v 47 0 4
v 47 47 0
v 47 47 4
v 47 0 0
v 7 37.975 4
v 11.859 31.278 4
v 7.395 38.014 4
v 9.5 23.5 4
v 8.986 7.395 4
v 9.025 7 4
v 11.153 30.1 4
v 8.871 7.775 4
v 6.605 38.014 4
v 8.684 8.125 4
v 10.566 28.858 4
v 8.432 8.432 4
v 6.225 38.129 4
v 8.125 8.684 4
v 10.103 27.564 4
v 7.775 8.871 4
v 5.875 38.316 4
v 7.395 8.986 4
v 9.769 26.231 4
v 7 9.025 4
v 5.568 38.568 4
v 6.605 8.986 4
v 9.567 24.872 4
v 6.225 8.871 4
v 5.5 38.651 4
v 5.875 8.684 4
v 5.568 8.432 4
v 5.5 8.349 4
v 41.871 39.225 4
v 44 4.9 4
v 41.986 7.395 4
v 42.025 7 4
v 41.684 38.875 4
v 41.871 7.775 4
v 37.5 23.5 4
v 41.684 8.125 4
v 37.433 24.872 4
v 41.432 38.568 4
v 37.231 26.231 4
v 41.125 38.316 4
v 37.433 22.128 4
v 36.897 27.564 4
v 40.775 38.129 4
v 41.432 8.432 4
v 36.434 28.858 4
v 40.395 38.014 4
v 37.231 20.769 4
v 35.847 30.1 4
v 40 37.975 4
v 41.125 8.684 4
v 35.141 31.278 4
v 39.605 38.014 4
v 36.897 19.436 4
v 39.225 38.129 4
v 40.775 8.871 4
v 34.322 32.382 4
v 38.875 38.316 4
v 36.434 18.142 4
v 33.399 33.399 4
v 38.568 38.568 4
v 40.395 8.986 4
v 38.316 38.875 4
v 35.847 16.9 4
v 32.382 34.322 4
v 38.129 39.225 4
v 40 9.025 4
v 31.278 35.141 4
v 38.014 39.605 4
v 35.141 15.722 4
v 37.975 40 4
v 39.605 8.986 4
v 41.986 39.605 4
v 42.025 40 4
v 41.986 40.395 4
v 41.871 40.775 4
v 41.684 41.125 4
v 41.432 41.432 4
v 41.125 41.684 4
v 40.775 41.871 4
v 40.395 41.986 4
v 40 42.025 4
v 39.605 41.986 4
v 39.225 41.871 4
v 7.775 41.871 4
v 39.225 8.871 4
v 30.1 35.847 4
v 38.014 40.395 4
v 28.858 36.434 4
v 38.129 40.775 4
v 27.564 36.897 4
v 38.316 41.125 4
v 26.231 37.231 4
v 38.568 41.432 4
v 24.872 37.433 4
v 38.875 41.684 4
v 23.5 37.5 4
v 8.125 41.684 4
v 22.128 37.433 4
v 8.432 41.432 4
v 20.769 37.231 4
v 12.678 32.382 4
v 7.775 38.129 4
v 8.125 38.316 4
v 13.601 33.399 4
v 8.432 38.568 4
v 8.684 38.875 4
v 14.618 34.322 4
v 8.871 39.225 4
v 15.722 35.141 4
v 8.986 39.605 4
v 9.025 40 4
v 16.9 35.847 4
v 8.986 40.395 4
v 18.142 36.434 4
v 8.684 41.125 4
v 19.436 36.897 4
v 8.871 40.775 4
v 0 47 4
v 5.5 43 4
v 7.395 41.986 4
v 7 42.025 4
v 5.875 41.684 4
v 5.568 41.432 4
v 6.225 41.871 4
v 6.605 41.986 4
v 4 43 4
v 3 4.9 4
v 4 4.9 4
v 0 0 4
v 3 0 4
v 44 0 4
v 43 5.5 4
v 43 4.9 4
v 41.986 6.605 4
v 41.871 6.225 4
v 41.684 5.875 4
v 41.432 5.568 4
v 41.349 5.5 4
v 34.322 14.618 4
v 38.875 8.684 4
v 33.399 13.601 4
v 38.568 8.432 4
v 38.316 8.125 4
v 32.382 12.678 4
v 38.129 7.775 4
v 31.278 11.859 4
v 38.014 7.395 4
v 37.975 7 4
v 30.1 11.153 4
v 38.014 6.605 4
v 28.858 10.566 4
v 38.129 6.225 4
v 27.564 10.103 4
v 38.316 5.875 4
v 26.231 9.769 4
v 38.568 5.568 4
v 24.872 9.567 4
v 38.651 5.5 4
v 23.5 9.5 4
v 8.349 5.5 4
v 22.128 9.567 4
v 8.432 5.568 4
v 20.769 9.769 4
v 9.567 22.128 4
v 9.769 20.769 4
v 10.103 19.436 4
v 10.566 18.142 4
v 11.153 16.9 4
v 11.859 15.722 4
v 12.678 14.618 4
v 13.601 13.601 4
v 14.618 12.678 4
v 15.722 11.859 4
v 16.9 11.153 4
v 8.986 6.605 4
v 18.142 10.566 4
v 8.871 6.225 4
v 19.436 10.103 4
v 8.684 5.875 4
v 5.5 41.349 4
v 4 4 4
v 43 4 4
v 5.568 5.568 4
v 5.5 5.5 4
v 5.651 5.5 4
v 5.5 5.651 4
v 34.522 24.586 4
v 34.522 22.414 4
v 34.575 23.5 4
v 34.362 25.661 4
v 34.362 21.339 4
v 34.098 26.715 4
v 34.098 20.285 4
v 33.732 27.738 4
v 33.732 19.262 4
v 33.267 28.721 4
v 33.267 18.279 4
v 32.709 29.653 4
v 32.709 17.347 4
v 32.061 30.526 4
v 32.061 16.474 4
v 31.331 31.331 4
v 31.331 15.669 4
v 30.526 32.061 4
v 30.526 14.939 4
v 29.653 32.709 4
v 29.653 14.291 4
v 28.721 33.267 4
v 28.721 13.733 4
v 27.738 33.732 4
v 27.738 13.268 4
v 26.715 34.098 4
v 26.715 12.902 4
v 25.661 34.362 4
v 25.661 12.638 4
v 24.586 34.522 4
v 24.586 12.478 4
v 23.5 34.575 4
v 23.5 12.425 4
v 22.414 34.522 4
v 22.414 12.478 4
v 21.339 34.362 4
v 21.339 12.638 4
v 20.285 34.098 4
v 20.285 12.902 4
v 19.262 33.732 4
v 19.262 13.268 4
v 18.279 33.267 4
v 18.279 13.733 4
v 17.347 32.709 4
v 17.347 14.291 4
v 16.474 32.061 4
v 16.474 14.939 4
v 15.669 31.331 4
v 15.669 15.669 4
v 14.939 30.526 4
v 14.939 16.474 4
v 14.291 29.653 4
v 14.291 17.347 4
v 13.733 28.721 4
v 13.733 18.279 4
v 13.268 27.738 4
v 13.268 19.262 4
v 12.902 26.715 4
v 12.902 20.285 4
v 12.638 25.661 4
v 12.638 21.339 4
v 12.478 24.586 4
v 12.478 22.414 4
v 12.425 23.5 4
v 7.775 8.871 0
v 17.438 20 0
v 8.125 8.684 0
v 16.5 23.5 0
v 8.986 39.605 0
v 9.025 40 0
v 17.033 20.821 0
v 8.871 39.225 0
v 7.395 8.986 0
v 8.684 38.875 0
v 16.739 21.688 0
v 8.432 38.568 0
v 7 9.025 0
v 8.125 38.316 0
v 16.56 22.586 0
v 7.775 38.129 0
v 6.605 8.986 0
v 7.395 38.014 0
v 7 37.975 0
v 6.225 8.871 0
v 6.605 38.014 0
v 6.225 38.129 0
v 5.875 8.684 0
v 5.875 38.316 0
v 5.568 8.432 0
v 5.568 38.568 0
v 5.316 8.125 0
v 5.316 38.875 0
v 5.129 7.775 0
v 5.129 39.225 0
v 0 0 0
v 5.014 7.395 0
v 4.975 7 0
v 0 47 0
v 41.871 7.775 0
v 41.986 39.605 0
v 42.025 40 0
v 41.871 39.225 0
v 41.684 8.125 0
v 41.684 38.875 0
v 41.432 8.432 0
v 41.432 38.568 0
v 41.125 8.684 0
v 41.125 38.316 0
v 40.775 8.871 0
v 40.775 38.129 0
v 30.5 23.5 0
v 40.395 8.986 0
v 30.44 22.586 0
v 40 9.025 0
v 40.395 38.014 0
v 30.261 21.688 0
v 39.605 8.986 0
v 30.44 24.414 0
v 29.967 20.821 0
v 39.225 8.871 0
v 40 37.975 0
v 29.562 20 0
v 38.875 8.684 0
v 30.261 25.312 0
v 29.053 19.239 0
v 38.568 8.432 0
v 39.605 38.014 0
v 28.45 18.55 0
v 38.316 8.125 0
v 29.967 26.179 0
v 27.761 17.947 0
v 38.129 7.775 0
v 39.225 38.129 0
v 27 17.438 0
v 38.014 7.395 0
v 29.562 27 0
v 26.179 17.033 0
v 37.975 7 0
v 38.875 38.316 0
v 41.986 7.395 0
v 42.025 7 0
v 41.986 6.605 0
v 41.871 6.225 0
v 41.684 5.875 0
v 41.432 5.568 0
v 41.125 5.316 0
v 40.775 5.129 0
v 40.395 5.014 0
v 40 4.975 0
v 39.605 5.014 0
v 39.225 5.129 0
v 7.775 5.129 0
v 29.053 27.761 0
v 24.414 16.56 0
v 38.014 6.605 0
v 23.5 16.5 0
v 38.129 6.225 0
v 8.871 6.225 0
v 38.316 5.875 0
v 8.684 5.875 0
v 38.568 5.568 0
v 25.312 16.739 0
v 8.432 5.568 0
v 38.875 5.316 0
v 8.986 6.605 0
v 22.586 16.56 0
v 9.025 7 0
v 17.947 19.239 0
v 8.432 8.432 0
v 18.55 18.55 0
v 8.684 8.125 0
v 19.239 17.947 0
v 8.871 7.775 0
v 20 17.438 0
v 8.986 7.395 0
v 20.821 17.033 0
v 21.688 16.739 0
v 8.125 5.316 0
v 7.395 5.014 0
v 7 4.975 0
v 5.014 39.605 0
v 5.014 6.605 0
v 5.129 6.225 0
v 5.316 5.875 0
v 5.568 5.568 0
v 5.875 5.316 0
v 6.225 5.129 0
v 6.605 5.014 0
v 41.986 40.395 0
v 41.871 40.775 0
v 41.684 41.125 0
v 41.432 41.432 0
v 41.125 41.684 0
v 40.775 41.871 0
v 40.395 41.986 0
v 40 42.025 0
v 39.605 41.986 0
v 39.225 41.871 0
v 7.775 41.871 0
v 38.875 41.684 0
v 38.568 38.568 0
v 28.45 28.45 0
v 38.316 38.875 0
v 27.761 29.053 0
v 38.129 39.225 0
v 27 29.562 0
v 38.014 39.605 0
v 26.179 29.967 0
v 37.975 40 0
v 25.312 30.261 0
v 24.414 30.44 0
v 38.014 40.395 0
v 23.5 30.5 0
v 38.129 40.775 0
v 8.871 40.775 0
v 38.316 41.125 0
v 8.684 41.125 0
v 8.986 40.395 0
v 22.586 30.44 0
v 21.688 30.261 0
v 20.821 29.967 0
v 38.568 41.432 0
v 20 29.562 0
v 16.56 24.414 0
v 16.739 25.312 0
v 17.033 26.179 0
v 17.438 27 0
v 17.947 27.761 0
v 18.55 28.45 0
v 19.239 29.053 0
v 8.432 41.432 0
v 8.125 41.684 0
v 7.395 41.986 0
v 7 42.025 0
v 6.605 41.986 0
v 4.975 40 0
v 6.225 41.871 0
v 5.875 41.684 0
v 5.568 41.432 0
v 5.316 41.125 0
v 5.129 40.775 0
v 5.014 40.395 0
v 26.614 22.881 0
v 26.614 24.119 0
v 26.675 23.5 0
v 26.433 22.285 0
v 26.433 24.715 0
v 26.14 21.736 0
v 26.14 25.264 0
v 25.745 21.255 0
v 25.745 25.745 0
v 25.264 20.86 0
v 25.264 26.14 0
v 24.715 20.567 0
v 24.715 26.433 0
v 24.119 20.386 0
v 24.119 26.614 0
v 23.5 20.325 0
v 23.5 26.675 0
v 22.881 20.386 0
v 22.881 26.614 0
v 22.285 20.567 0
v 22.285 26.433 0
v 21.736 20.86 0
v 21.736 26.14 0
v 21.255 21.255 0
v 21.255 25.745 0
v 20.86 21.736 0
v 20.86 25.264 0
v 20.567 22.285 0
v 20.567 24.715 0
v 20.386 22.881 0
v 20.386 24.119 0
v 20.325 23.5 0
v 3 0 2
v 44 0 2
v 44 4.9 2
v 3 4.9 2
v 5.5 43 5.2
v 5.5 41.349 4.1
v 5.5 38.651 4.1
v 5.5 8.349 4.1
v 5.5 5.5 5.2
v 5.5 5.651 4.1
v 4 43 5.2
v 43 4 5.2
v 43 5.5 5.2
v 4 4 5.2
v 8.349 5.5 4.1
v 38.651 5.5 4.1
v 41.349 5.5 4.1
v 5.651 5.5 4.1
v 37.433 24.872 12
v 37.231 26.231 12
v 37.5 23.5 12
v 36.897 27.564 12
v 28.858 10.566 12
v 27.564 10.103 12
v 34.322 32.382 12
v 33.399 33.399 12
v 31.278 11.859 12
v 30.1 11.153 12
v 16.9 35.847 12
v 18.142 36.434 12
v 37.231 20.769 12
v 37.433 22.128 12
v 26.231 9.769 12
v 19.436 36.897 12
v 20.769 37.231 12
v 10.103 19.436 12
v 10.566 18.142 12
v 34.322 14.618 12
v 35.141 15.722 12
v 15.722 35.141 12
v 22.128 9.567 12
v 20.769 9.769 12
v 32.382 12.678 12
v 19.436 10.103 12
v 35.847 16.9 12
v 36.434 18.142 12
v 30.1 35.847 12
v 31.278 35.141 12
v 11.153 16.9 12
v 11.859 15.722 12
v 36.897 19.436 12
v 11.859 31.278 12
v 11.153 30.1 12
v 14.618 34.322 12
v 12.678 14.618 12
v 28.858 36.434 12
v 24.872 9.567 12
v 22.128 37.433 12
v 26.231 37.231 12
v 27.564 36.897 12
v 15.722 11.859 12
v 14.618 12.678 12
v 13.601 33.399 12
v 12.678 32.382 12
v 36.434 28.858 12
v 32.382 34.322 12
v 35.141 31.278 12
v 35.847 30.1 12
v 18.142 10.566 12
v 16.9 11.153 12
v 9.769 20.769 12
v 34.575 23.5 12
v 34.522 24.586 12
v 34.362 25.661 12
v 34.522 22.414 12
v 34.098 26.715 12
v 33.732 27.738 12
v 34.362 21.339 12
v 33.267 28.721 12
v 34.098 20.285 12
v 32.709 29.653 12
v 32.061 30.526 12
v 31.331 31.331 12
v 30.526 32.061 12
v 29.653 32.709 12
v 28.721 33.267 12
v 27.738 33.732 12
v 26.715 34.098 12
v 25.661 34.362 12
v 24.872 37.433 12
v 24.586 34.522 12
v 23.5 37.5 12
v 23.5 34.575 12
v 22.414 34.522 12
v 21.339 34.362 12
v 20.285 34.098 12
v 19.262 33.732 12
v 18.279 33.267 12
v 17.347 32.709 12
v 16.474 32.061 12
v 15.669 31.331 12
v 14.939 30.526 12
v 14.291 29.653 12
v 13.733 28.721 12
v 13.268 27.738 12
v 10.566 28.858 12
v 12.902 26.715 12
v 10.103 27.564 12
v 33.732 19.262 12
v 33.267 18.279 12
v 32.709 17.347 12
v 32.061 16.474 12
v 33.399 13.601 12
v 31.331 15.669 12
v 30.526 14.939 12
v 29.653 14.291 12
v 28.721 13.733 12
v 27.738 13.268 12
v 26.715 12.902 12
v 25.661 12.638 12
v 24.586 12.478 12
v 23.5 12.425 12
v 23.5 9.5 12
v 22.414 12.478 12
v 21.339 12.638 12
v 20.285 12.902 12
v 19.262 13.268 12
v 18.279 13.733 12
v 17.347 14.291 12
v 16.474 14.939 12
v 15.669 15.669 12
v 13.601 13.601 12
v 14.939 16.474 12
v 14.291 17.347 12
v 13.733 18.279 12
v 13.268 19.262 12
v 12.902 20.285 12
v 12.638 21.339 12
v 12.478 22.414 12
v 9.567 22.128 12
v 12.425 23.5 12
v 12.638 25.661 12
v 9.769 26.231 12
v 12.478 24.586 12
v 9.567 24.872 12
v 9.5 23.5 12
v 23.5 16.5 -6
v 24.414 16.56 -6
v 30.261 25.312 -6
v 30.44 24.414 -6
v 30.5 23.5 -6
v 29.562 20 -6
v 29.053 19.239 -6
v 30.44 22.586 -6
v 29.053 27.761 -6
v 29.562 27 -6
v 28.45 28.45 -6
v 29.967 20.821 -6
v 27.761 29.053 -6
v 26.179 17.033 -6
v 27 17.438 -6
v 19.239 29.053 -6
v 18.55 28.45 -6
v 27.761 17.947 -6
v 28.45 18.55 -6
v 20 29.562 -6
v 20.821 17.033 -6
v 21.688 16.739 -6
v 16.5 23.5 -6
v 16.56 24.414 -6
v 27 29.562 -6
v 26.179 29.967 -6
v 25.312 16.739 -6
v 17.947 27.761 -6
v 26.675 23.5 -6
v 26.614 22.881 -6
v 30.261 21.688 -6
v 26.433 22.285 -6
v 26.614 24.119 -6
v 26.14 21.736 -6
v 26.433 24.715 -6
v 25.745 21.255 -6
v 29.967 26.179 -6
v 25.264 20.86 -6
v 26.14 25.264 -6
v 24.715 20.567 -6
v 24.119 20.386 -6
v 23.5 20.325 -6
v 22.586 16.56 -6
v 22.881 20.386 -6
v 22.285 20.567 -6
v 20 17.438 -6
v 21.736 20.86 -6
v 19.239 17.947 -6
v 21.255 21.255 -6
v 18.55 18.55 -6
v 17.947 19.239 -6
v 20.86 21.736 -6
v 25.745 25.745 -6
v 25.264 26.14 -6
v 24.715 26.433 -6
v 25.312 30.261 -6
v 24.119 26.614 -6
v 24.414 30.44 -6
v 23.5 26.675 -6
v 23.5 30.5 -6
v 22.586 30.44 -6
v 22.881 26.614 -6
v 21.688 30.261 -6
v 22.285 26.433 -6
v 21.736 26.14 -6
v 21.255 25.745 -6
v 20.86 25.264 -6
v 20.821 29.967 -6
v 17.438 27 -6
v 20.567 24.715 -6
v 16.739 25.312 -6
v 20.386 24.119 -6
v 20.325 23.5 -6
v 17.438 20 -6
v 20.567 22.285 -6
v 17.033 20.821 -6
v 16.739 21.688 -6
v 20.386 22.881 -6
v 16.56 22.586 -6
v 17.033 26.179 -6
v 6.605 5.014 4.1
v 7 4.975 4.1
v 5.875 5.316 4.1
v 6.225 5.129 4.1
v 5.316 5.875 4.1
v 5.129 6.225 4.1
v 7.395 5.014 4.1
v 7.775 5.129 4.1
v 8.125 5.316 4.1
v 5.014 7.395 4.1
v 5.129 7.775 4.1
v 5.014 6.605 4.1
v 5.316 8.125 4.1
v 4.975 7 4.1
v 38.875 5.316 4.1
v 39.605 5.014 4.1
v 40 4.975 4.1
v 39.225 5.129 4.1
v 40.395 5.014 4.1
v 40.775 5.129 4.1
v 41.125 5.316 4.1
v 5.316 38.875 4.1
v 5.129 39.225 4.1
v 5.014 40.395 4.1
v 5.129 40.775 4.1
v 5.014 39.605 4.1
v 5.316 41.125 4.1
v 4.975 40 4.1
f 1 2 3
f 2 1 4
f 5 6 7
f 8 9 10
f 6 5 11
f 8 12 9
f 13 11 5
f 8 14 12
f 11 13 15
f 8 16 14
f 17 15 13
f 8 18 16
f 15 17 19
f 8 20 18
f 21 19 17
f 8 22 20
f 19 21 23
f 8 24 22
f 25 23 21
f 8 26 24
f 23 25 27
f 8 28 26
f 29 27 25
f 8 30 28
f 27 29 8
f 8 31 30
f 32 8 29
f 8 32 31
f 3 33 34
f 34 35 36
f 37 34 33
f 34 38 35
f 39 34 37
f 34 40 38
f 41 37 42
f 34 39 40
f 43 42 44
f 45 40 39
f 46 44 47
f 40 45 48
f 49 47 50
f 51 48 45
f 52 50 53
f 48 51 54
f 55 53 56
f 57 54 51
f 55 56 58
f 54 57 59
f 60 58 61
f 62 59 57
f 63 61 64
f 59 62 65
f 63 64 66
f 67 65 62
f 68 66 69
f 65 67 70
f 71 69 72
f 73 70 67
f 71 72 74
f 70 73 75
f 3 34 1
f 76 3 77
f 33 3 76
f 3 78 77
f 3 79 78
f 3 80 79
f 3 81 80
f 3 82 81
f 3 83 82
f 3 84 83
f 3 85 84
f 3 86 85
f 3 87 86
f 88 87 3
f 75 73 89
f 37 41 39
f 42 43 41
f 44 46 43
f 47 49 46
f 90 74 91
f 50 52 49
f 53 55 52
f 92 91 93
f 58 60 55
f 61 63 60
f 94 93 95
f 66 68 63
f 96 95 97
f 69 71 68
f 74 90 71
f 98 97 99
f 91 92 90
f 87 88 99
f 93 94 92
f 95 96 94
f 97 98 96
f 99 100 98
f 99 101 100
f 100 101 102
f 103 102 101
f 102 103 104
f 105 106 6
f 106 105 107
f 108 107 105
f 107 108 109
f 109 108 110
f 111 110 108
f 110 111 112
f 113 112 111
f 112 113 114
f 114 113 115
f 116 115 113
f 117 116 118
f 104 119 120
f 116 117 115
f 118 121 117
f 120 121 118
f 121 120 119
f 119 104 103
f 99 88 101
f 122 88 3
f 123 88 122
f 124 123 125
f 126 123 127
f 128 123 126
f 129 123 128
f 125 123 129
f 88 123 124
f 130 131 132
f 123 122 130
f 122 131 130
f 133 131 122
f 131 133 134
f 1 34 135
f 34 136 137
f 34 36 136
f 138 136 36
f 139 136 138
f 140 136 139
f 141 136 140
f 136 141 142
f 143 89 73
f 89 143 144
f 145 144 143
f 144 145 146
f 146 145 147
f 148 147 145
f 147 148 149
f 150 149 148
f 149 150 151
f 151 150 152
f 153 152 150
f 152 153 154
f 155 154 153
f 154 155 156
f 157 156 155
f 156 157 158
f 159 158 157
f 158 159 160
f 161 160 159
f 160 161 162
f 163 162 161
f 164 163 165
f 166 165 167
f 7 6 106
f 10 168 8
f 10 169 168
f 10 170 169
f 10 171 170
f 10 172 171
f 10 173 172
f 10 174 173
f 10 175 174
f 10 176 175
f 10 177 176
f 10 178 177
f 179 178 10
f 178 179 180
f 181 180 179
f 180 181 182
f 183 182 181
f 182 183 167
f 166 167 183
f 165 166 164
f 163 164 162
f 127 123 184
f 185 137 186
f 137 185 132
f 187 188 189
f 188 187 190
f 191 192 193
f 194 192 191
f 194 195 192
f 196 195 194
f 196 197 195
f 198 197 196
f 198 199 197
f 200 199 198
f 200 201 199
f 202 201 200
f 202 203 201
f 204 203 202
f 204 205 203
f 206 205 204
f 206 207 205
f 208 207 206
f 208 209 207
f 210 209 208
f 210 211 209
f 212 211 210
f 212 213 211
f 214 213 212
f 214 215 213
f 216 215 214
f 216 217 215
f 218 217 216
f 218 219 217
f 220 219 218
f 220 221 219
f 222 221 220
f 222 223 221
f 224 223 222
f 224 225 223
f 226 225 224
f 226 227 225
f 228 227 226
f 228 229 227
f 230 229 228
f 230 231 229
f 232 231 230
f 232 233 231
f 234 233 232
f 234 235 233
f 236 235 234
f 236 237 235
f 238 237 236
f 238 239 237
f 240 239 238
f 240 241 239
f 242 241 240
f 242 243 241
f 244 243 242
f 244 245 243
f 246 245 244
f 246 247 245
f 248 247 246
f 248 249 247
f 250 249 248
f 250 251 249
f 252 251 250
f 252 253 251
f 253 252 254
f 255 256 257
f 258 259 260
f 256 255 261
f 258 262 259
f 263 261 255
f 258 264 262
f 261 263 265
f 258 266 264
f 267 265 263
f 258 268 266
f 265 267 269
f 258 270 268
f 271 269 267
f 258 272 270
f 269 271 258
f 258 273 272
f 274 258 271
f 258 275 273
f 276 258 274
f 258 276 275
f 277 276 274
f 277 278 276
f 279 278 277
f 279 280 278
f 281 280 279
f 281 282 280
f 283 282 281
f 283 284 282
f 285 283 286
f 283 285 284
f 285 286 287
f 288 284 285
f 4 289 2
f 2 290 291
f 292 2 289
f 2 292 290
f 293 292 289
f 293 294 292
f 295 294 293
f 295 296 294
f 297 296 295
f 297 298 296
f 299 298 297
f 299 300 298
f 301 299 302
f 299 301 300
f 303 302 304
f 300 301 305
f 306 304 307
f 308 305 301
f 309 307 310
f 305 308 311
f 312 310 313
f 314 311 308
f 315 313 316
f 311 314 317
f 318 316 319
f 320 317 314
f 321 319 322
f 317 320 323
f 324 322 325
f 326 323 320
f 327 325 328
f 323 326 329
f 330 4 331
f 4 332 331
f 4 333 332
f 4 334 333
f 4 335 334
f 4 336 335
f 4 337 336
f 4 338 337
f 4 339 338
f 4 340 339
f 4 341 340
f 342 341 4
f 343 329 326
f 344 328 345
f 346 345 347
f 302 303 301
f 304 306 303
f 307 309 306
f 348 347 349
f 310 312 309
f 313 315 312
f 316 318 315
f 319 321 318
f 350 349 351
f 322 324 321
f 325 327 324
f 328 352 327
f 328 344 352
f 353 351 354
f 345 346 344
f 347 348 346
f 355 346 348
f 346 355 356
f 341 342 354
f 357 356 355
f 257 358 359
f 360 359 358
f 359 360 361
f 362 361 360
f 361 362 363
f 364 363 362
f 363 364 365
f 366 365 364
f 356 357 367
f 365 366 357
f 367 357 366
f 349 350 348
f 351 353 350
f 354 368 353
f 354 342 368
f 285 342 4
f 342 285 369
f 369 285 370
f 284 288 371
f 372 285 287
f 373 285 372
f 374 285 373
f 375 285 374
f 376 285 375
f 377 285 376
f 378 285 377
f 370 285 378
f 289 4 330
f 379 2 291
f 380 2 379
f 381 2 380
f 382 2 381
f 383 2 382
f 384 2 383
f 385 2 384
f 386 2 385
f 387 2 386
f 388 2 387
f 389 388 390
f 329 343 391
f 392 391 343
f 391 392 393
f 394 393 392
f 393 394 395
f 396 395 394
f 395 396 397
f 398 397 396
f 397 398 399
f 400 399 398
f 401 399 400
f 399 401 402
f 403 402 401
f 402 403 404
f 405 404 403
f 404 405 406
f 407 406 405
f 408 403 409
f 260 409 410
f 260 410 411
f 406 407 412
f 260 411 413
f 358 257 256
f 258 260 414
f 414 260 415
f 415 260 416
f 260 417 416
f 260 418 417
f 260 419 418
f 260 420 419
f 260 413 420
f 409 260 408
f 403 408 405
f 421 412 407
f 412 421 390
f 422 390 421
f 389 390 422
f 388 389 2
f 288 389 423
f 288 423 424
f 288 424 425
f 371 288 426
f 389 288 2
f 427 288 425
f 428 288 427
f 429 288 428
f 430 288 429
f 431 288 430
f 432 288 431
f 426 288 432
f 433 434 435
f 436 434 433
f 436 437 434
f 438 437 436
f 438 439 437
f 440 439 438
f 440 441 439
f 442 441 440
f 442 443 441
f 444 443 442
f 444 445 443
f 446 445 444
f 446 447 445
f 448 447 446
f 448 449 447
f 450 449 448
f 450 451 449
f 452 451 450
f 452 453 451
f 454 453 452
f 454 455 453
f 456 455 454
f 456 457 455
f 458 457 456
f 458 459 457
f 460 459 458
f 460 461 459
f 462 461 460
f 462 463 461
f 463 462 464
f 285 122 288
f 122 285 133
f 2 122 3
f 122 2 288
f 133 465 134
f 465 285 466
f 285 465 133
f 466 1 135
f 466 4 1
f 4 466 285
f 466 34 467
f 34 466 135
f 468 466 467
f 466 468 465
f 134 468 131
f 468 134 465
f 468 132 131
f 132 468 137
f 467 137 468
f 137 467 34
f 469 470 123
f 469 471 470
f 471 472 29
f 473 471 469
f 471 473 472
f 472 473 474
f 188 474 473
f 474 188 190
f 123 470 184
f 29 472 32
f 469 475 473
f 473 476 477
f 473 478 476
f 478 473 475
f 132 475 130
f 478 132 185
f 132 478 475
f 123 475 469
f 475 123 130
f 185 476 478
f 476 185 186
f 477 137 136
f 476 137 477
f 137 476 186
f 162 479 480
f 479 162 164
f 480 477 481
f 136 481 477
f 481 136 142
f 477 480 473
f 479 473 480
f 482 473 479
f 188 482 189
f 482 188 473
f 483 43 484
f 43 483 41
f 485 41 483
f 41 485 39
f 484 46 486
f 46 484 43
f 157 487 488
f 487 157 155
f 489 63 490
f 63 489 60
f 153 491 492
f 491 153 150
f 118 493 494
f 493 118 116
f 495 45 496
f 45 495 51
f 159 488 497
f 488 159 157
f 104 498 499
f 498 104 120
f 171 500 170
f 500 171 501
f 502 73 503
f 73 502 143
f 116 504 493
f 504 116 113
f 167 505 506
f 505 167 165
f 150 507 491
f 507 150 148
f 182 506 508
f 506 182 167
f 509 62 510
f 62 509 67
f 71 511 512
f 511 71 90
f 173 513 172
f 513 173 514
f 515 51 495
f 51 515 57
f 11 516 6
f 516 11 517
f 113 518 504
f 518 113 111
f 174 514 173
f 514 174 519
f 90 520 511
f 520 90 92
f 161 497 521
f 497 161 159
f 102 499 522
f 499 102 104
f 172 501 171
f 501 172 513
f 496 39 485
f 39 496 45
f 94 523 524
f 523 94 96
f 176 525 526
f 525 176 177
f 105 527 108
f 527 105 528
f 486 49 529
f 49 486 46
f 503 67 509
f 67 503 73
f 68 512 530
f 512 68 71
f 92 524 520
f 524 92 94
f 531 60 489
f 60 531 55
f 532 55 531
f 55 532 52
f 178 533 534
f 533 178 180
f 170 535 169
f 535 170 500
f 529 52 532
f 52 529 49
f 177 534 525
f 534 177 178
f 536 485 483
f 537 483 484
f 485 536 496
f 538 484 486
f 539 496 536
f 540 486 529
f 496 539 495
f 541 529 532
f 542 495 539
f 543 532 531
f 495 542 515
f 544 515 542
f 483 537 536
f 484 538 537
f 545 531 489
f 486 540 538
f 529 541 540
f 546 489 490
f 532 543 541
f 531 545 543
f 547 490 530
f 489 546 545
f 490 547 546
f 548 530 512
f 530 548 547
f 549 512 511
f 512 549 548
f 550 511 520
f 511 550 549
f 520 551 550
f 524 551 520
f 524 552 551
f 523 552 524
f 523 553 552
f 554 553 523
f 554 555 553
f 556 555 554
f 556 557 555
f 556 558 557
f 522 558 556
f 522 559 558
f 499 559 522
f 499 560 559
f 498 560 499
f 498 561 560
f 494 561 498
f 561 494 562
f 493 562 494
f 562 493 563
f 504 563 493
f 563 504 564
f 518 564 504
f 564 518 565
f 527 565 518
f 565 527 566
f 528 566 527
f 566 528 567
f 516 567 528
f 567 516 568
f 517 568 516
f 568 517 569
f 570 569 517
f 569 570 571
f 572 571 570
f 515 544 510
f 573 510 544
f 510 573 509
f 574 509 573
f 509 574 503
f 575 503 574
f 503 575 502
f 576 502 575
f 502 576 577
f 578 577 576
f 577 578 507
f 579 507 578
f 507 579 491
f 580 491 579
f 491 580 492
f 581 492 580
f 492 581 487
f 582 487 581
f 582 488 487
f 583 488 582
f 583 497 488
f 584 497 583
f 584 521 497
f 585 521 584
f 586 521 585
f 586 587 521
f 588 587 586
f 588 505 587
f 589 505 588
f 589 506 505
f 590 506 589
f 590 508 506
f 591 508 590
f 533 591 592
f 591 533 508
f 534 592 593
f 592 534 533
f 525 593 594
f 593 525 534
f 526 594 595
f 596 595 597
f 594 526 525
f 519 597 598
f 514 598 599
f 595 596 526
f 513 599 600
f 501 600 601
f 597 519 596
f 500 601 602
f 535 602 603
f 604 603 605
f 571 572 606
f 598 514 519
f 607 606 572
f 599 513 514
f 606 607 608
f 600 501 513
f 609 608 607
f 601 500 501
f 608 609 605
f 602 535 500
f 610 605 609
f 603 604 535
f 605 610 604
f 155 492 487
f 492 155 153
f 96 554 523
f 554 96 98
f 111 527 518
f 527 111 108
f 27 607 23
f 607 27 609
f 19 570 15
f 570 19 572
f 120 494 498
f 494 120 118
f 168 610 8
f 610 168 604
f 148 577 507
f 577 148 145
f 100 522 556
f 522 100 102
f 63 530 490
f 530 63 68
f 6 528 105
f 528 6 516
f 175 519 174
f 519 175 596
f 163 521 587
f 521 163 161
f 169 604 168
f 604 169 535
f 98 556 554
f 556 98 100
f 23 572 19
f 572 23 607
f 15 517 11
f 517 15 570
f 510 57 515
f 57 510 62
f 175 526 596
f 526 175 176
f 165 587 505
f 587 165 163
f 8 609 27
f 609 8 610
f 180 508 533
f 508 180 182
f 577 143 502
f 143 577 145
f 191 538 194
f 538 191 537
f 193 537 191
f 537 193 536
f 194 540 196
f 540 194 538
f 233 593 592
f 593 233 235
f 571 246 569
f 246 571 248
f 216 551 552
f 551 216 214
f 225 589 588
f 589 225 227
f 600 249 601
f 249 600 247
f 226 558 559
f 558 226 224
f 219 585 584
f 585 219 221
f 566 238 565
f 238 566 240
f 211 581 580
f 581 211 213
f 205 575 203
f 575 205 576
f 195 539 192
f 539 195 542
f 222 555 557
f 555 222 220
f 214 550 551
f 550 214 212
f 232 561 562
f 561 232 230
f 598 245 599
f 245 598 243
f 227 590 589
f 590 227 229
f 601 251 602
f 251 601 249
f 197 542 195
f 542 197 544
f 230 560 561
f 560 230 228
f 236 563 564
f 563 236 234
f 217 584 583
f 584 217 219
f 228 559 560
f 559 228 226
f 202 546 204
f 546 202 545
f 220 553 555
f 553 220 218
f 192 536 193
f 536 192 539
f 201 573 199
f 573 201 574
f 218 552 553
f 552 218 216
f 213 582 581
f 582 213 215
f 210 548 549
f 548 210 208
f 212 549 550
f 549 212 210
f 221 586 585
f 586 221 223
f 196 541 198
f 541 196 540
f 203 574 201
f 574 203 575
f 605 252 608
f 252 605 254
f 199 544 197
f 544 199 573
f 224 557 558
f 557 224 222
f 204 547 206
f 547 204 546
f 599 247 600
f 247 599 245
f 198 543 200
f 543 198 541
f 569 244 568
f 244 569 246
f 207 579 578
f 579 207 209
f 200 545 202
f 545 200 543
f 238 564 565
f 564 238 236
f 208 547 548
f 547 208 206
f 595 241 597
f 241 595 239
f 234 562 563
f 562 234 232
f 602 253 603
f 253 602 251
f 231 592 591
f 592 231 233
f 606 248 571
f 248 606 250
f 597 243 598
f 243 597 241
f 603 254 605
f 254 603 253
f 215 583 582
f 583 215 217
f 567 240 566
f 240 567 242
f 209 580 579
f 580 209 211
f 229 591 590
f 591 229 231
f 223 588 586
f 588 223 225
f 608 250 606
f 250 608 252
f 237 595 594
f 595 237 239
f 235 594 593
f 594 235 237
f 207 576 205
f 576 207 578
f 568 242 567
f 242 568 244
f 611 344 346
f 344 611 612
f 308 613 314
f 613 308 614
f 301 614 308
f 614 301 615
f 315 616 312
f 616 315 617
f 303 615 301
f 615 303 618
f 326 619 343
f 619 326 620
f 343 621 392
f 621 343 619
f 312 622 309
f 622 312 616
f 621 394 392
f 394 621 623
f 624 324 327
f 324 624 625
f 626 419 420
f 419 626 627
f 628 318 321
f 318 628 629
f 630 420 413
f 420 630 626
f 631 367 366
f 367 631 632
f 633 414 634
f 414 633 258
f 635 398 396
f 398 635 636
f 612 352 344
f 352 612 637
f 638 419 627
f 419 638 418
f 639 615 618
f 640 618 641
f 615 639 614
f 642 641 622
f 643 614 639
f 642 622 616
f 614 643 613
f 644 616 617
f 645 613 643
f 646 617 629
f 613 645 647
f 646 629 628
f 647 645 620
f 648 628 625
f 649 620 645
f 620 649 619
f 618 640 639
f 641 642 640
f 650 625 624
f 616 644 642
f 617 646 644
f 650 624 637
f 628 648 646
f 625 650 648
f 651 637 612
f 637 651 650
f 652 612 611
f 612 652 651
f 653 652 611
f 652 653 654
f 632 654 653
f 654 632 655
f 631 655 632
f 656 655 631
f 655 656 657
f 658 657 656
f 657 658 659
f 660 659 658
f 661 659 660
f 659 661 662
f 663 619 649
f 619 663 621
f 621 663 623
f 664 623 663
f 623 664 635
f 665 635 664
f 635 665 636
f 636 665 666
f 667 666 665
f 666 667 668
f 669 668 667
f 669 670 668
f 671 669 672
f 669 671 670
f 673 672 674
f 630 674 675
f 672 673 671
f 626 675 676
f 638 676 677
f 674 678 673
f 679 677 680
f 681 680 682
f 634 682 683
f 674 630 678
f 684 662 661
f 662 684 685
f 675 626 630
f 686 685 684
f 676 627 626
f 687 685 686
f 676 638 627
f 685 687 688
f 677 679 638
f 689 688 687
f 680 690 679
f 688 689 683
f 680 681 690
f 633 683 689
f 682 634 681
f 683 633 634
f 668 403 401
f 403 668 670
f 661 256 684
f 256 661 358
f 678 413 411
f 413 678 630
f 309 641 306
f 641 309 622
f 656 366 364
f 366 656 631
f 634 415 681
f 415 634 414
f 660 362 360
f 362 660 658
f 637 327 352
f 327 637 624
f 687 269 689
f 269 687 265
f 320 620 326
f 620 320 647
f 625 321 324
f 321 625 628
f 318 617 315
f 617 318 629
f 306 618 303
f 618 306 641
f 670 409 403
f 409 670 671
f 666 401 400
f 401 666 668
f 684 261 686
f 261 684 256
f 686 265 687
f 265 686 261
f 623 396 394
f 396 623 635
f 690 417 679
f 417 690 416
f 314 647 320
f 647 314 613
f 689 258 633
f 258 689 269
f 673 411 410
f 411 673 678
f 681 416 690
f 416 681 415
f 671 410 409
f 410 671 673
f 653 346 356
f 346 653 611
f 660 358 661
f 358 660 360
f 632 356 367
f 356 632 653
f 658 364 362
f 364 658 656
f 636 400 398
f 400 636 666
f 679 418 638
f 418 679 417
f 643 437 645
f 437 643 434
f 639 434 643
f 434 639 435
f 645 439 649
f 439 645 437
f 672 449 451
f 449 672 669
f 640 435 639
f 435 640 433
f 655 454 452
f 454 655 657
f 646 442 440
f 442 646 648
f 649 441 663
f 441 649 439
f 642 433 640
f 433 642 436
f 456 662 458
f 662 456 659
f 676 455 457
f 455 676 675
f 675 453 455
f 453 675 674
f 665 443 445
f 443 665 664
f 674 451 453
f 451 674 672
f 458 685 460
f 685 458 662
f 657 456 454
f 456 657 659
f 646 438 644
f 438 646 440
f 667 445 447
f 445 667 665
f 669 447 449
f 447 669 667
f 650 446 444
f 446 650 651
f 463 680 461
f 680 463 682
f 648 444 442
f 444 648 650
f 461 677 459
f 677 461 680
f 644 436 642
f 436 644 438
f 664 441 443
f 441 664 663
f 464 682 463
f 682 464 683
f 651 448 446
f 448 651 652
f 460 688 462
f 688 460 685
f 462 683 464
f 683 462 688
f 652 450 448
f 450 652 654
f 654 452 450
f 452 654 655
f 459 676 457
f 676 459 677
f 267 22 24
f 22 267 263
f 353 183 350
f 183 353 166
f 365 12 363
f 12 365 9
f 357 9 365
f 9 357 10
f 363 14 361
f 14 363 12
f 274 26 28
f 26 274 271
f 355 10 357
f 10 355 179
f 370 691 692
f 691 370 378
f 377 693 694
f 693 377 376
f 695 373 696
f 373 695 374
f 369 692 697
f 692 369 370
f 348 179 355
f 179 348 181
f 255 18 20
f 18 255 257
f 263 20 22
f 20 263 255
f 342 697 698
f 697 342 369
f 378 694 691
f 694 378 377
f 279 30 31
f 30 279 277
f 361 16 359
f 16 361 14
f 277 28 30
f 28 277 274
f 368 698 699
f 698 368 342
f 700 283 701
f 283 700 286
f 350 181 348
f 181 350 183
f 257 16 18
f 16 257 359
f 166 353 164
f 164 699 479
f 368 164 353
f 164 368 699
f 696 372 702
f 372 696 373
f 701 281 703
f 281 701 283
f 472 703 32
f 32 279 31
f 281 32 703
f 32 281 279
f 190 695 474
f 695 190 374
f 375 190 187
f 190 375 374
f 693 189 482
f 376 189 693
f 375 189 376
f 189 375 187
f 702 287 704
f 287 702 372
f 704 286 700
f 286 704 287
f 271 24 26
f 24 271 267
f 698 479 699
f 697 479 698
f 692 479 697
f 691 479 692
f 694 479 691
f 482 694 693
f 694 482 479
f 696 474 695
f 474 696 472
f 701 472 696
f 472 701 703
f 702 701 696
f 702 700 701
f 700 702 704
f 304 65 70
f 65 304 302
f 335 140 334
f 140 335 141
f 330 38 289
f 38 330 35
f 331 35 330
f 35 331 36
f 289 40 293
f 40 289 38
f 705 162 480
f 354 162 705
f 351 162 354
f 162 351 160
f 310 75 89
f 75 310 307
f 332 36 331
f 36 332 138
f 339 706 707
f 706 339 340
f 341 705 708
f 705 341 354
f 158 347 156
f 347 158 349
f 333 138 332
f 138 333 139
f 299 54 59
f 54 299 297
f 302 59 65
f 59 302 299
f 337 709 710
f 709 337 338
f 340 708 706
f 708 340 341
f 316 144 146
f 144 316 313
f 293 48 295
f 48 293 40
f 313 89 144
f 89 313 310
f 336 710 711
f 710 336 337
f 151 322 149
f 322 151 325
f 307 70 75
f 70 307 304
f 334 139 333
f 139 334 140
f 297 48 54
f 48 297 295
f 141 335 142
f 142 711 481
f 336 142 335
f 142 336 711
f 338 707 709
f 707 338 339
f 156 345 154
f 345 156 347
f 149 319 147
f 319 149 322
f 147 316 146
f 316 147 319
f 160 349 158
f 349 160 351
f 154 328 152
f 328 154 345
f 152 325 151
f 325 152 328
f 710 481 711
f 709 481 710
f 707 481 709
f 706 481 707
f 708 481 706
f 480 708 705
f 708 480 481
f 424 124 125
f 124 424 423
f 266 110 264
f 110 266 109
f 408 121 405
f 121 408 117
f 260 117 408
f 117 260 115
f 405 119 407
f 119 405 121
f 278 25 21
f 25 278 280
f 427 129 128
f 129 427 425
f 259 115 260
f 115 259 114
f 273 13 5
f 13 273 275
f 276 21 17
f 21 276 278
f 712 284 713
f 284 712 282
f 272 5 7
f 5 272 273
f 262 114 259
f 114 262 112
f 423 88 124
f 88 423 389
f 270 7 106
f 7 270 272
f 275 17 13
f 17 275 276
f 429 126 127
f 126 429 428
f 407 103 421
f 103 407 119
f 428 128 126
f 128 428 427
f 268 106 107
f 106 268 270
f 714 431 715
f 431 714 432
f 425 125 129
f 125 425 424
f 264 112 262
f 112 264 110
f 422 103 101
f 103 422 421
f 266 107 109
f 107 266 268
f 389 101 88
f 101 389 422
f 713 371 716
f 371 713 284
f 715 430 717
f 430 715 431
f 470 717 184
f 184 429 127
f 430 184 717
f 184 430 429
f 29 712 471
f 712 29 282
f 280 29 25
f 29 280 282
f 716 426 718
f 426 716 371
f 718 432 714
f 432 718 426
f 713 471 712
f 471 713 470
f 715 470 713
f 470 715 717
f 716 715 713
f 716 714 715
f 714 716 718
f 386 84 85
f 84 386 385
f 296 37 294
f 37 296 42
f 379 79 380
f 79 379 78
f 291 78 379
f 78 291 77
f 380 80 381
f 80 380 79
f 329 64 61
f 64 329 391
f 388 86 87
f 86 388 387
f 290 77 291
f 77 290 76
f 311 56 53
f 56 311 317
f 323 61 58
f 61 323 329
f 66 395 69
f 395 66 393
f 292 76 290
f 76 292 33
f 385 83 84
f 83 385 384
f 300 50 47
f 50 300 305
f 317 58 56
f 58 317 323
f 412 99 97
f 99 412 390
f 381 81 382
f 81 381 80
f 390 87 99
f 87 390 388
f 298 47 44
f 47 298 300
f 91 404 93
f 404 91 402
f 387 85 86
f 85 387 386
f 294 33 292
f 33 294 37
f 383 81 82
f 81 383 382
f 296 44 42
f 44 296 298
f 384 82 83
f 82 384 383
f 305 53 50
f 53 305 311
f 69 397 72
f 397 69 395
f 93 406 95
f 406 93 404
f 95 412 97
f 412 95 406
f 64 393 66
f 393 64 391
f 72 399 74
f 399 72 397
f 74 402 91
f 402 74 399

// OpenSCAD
// Support caméra InnoMaker CAM-OV5647 pour Pavois
// A VERIFIER AVANT IMPRESSION : l'espacement des trous (board_hole_spacing) est une
// hypothese (33mm, format standard des cartes 39x39 M12) -- pas confirme par la doc
// InnoMaker. Mesurer au pied a coulisse sur la vraie carte avant impression finale.

// ===== Carte camera (mesures / doc InnoMaker) =====
board_size          = 39;    // carte carree 39x39mm (hors nappe FPC)
board_thickness     = 1.2;   // epaisseur PCB typique, a verifier
board_hole_d        = 2.2;   // diametre trou carte (doc: "4x D=2.20mm")
board_hole_inset    = 3;     // hypothese: trous a 3mm des bords -> espacement 33mm
board_hole_spacing  = board_size - 2*board_hole_inset;  // = 33mm si inset=3

lens_seat_d         = 22;    // doc: "Lens Seat Spacing: 22mm" -- diametre du support M12
lens_barrel_h        = 8;    // hauteur du support d'objectif au-dessus du PCB, a verifier

// ===== Reglages d'impression (a calibrer avec une eprouvette de tolerance) =====
print_tolerance     = 0.15;  // jeu a retirer/ajouter selon test d'impression reel
use_heatset_insert  = true;  // true = trou pour insert laiton M2.5, false = vis directe
insert_hole_d       = 3.9;   // diametre trou pour insert M2.5 standard (a verifier selon insert)
screw_clear_d       = 2.7;   // diametre passage vis M2.5 si pas d'insert

// ===== Plaque support =====
plate_margin        = 4;     // marge autour de la carte
plate_size          = board_size + 2*plate_margin;
plate_thickness     = 4;

lip_height          = 1.2;   // hauteur du rebord de calage (equerre)
lip_width           = 1.5;

tripod_hole_d       = 6.35;  // filetage 1/4"-20 standard trepied -- prevoir insert dedie
tripod_boss_d       = 14;
tripod_boss_h       = 6;

module base_plate() {
    difference() {
        cube([plate_size, plate_size, plate_thickness]);

        // Degagement pour la nappe FPC (bord "avant" de la carte)
        translate([plate_margin - 1, -0.1, plate_thickness - 2])
            cube([board_size + 2, plate_margin + 1, 2.1]);
    }
}

module locating_lip() {
    // Equerre de reference: cale la carte sur 2 bords perpendiculaires
    // (bord gauche + bord bas de la zone carte), independamment du jeu des trous
    translate([plate_margin, plate_margin, plate_thickness])
        cube([lip_width, board_size, lip_height]);
    translate([plate_margin, plate_margin, plate_thickness])
        cube([board_size, lip_width, lip_height]);
}

module mount_holes() {
    d = use_heatset_insert ? insert_hole_d : screw_clear_d;
    positions = [
        [plate_margin + board_hole_inset, plate_margin + board_hole_inset],
        [plate_margin + board_hole_inset + board_hole_spacing, plate_margin + board_hole_inset],
        [plate_margin + board_hole_inset, plate_margin + board_hole_inset + board_hole_spacing],
        [plate_margin + board_hole_inset + board_hole_spacing, plate_margin + board_hole_inset + board_hole_spacing],
    ];
    for (p = positions)
        translate([p[0], p[1], -0.1])
            cylinder(d = d + print_tolerance, h = plate_thickness + 0.2, $fn = 32);
}

module lens_collar() {
    // Collerette qui enserre le support d'objectif M12 -- c'est elle qui tient
    // l'axe optique droit, pas les trous de la carte.
    cx = plate_size / 2;
    cy = plate_size / 2;
    translate([cx, cy, plate_thickness])
        difference() {
            cylinder(d = lens_seat_d + 6, h = lens_barrel_h, $fn = 64);
            translate([0, 0, -0.1])
                cylinder(d = lens_seat_d + print_tolerance, h = lens_barrel_h + 0.2, $fn = 64);
        }
}

module tripod_boss() {
    // Filetage 1/4"-20 standard trepied sous la plaque
    translate([plate_size / 2, plate_size / 2, -tripod_boss_h])
        difference() {
            cylinder(d = tripod_boss_d, h = tripod_boss_h, $fn = 48);
            translate([0, 0, -0.1])
                cylinder(d = tripod_hole_d, h = tripod_boss_h + 0.2, $fn = 32);
        }
}

difference() {
    union() {
        base_plate();
        locating_lip();
        lens_collar();
        tripod_boss();
    }
    mount_holes();
}

// Notes d'impression :
// - Imprimer avec l'axe des trous VERTICAL (perpendiculaire au plateau) : les trous
//   sortent ronds et precis dans cette orientation, ovales/imprecis a plat.
// - PETG recommande (moins de fluage/retrait que PLA si le rig reste dehors au soleil).
// - Avant impression finale : imprimer une petite eprouvette avec plusieurs diametres
//   de trous (2.0 / 2.1 / 2.2 / 2.3 / 2.4mm) et tester l'insert/la vis pour trouver
//   le print_tolerance reel de cette imprimante, puis ajuster la variable ci-dessus.
// - Imprimer 2 exemplaires identiques (Cam0 + Cam1) pour le premier test Phase 1.
